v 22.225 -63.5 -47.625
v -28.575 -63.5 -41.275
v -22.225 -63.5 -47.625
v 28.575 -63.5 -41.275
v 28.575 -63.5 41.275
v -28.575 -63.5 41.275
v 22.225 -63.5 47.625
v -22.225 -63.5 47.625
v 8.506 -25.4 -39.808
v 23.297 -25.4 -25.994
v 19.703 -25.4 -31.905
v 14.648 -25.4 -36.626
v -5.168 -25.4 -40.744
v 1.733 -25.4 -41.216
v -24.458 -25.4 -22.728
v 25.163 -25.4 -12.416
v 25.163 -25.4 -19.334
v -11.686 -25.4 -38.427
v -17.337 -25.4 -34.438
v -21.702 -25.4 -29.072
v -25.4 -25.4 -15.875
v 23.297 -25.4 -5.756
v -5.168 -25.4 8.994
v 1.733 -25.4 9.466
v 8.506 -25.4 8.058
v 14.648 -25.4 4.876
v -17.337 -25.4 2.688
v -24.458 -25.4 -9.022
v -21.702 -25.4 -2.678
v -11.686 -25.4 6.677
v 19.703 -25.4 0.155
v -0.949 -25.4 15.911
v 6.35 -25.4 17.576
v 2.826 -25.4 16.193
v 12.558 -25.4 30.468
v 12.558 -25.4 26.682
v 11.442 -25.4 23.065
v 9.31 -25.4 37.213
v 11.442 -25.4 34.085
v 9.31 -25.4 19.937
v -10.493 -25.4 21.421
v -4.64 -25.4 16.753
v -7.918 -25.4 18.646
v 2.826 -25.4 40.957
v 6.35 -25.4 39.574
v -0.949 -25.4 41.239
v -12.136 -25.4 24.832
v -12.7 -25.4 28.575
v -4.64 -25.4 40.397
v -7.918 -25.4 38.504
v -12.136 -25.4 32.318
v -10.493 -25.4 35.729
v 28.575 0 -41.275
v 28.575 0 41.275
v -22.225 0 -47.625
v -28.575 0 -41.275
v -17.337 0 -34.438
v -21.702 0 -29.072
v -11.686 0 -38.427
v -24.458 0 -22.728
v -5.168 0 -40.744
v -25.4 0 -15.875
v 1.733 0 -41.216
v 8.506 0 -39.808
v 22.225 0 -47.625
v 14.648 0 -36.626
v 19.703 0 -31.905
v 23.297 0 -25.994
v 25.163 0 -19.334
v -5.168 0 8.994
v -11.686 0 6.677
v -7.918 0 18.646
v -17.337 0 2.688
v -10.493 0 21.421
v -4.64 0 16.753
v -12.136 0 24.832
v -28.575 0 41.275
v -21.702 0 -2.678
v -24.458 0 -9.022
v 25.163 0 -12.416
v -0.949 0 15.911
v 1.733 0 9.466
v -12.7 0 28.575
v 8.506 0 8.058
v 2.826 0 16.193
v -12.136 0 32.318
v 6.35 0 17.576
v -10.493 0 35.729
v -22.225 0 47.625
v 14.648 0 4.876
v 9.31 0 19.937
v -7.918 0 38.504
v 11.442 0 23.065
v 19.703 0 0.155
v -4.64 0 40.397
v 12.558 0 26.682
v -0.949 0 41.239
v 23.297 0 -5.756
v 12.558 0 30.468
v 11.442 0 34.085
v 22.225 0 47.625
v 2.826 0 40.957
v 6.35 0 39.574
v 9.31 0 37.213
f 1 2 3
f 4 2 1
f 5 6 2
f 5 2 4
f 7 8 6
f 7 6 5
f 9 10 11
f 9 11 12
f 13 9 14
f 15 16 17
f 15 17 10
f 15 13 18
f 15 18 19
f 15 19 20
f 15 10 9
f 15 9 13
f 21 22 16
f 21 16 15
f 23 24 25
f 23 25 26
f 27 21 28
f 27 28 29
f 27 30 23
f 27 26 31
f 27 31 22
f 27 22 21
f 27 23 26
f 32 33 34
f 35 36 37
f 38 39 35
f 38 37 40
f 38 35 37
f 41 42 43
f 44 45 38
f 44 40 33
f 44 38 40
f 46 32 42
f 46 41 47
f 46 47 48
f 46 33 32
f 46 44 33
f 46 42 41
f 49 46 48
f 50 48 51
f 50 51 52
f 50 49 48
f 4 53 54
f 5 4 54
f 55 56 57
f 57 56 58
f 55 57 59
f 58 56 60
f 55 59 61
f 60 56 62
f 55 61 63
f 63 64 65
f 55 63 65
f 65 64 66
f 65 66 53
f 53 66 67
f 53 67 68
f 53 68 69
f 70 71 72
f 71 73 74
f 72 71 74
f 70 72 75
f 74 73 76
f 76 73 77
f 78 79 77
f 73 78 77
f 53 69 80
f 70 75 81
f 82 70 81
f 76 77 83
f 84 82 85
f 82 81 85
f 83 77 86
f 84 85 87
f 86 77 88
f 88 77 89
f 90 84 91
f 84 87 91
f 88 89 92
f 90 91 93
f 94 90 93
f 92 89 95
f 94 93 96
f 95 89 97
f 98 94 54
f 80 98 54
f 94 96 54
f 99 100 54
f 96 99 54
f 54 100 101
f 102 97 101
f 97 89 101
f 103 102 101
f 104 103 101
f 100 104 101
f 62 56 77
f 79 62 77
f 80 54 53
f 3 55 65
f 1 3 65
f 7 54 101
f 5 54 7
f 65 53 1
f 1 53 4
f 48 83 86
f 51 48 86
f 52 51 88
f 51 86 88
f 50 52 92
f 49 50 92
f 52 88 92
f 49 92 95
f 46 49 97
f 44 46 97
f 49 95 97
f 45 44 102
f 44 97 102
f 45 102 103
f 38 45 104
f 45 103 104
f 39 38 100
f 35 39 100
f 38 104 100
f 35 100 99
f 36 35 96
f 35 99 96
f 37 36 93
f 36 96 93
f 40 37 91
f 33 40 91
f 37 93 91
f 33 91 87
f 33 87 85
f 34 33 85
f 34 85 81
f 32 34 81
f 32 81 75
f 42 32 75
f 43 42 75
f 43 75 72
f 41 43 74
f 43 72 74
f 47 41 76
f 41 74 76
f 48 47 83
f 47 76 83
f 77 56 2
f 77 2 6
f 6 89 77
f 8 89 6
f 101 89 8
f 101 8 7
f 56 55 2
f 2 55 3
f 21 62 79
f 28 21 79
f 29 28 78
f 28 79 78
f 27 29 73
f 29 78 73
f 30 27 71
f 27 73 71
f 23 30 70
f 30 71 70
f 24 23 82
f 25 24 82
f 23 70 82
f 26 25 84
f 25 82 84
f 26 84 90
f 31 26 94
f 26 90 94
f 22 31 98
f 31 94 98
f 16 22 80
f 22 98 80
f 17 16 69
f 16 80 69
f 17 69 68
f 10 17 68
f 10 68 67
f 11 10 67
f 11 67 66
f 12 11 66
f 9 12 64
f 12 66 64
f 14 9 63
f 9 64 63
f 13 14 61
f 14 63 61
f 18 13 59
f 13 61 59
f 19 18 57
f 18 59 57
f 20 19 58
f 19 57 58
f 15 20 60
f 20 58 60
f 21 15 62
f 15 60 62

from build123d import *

# Parameters (mm, degrees)
F0_W     = 57.15
F0_H     = 95.25
F1_DEPTH = 63.5
F2_R     = 12.7
F2_R_2   = 25.4
F3_DEPTH = 25.4
F4_SIZE  = 6.35


with BuildPart() as f1:
    # F0 (on Front) → F1 (new body)
    with BuildSketch(Plane.XZ):
        Rectangle(F0_W, F0_H)
    extrude(amount=F1_DEPTH)

    # F2 (on face) → F3 (cut)
    with BuildSketch(Plane(origin=(0, 0, 0), x_dir=(-1, 0, 0), z_dir=(0, 1, 0))):
        with Locations((0, 28.575)):
            Circle(F2_R)
        with Locations((0, -15.875)):
            Circle(F2_R_2)
    extrude(amount=-F3_DEPTH, mode=Mode.SUBTRACT)

    # F4
    f4_edges = [f1.edges().sort_by_distance(p)[0] for p in [
        (-28.575, -31.75, 47.625),
        (28.575, -31.75, 47.625),
        (28.575, -31.75, -47.625),
        (-28.575, -31.75, -47.625),
    ]]
    chamfer(f4_edges, length=F4_SIZE)


solid = f1.part
